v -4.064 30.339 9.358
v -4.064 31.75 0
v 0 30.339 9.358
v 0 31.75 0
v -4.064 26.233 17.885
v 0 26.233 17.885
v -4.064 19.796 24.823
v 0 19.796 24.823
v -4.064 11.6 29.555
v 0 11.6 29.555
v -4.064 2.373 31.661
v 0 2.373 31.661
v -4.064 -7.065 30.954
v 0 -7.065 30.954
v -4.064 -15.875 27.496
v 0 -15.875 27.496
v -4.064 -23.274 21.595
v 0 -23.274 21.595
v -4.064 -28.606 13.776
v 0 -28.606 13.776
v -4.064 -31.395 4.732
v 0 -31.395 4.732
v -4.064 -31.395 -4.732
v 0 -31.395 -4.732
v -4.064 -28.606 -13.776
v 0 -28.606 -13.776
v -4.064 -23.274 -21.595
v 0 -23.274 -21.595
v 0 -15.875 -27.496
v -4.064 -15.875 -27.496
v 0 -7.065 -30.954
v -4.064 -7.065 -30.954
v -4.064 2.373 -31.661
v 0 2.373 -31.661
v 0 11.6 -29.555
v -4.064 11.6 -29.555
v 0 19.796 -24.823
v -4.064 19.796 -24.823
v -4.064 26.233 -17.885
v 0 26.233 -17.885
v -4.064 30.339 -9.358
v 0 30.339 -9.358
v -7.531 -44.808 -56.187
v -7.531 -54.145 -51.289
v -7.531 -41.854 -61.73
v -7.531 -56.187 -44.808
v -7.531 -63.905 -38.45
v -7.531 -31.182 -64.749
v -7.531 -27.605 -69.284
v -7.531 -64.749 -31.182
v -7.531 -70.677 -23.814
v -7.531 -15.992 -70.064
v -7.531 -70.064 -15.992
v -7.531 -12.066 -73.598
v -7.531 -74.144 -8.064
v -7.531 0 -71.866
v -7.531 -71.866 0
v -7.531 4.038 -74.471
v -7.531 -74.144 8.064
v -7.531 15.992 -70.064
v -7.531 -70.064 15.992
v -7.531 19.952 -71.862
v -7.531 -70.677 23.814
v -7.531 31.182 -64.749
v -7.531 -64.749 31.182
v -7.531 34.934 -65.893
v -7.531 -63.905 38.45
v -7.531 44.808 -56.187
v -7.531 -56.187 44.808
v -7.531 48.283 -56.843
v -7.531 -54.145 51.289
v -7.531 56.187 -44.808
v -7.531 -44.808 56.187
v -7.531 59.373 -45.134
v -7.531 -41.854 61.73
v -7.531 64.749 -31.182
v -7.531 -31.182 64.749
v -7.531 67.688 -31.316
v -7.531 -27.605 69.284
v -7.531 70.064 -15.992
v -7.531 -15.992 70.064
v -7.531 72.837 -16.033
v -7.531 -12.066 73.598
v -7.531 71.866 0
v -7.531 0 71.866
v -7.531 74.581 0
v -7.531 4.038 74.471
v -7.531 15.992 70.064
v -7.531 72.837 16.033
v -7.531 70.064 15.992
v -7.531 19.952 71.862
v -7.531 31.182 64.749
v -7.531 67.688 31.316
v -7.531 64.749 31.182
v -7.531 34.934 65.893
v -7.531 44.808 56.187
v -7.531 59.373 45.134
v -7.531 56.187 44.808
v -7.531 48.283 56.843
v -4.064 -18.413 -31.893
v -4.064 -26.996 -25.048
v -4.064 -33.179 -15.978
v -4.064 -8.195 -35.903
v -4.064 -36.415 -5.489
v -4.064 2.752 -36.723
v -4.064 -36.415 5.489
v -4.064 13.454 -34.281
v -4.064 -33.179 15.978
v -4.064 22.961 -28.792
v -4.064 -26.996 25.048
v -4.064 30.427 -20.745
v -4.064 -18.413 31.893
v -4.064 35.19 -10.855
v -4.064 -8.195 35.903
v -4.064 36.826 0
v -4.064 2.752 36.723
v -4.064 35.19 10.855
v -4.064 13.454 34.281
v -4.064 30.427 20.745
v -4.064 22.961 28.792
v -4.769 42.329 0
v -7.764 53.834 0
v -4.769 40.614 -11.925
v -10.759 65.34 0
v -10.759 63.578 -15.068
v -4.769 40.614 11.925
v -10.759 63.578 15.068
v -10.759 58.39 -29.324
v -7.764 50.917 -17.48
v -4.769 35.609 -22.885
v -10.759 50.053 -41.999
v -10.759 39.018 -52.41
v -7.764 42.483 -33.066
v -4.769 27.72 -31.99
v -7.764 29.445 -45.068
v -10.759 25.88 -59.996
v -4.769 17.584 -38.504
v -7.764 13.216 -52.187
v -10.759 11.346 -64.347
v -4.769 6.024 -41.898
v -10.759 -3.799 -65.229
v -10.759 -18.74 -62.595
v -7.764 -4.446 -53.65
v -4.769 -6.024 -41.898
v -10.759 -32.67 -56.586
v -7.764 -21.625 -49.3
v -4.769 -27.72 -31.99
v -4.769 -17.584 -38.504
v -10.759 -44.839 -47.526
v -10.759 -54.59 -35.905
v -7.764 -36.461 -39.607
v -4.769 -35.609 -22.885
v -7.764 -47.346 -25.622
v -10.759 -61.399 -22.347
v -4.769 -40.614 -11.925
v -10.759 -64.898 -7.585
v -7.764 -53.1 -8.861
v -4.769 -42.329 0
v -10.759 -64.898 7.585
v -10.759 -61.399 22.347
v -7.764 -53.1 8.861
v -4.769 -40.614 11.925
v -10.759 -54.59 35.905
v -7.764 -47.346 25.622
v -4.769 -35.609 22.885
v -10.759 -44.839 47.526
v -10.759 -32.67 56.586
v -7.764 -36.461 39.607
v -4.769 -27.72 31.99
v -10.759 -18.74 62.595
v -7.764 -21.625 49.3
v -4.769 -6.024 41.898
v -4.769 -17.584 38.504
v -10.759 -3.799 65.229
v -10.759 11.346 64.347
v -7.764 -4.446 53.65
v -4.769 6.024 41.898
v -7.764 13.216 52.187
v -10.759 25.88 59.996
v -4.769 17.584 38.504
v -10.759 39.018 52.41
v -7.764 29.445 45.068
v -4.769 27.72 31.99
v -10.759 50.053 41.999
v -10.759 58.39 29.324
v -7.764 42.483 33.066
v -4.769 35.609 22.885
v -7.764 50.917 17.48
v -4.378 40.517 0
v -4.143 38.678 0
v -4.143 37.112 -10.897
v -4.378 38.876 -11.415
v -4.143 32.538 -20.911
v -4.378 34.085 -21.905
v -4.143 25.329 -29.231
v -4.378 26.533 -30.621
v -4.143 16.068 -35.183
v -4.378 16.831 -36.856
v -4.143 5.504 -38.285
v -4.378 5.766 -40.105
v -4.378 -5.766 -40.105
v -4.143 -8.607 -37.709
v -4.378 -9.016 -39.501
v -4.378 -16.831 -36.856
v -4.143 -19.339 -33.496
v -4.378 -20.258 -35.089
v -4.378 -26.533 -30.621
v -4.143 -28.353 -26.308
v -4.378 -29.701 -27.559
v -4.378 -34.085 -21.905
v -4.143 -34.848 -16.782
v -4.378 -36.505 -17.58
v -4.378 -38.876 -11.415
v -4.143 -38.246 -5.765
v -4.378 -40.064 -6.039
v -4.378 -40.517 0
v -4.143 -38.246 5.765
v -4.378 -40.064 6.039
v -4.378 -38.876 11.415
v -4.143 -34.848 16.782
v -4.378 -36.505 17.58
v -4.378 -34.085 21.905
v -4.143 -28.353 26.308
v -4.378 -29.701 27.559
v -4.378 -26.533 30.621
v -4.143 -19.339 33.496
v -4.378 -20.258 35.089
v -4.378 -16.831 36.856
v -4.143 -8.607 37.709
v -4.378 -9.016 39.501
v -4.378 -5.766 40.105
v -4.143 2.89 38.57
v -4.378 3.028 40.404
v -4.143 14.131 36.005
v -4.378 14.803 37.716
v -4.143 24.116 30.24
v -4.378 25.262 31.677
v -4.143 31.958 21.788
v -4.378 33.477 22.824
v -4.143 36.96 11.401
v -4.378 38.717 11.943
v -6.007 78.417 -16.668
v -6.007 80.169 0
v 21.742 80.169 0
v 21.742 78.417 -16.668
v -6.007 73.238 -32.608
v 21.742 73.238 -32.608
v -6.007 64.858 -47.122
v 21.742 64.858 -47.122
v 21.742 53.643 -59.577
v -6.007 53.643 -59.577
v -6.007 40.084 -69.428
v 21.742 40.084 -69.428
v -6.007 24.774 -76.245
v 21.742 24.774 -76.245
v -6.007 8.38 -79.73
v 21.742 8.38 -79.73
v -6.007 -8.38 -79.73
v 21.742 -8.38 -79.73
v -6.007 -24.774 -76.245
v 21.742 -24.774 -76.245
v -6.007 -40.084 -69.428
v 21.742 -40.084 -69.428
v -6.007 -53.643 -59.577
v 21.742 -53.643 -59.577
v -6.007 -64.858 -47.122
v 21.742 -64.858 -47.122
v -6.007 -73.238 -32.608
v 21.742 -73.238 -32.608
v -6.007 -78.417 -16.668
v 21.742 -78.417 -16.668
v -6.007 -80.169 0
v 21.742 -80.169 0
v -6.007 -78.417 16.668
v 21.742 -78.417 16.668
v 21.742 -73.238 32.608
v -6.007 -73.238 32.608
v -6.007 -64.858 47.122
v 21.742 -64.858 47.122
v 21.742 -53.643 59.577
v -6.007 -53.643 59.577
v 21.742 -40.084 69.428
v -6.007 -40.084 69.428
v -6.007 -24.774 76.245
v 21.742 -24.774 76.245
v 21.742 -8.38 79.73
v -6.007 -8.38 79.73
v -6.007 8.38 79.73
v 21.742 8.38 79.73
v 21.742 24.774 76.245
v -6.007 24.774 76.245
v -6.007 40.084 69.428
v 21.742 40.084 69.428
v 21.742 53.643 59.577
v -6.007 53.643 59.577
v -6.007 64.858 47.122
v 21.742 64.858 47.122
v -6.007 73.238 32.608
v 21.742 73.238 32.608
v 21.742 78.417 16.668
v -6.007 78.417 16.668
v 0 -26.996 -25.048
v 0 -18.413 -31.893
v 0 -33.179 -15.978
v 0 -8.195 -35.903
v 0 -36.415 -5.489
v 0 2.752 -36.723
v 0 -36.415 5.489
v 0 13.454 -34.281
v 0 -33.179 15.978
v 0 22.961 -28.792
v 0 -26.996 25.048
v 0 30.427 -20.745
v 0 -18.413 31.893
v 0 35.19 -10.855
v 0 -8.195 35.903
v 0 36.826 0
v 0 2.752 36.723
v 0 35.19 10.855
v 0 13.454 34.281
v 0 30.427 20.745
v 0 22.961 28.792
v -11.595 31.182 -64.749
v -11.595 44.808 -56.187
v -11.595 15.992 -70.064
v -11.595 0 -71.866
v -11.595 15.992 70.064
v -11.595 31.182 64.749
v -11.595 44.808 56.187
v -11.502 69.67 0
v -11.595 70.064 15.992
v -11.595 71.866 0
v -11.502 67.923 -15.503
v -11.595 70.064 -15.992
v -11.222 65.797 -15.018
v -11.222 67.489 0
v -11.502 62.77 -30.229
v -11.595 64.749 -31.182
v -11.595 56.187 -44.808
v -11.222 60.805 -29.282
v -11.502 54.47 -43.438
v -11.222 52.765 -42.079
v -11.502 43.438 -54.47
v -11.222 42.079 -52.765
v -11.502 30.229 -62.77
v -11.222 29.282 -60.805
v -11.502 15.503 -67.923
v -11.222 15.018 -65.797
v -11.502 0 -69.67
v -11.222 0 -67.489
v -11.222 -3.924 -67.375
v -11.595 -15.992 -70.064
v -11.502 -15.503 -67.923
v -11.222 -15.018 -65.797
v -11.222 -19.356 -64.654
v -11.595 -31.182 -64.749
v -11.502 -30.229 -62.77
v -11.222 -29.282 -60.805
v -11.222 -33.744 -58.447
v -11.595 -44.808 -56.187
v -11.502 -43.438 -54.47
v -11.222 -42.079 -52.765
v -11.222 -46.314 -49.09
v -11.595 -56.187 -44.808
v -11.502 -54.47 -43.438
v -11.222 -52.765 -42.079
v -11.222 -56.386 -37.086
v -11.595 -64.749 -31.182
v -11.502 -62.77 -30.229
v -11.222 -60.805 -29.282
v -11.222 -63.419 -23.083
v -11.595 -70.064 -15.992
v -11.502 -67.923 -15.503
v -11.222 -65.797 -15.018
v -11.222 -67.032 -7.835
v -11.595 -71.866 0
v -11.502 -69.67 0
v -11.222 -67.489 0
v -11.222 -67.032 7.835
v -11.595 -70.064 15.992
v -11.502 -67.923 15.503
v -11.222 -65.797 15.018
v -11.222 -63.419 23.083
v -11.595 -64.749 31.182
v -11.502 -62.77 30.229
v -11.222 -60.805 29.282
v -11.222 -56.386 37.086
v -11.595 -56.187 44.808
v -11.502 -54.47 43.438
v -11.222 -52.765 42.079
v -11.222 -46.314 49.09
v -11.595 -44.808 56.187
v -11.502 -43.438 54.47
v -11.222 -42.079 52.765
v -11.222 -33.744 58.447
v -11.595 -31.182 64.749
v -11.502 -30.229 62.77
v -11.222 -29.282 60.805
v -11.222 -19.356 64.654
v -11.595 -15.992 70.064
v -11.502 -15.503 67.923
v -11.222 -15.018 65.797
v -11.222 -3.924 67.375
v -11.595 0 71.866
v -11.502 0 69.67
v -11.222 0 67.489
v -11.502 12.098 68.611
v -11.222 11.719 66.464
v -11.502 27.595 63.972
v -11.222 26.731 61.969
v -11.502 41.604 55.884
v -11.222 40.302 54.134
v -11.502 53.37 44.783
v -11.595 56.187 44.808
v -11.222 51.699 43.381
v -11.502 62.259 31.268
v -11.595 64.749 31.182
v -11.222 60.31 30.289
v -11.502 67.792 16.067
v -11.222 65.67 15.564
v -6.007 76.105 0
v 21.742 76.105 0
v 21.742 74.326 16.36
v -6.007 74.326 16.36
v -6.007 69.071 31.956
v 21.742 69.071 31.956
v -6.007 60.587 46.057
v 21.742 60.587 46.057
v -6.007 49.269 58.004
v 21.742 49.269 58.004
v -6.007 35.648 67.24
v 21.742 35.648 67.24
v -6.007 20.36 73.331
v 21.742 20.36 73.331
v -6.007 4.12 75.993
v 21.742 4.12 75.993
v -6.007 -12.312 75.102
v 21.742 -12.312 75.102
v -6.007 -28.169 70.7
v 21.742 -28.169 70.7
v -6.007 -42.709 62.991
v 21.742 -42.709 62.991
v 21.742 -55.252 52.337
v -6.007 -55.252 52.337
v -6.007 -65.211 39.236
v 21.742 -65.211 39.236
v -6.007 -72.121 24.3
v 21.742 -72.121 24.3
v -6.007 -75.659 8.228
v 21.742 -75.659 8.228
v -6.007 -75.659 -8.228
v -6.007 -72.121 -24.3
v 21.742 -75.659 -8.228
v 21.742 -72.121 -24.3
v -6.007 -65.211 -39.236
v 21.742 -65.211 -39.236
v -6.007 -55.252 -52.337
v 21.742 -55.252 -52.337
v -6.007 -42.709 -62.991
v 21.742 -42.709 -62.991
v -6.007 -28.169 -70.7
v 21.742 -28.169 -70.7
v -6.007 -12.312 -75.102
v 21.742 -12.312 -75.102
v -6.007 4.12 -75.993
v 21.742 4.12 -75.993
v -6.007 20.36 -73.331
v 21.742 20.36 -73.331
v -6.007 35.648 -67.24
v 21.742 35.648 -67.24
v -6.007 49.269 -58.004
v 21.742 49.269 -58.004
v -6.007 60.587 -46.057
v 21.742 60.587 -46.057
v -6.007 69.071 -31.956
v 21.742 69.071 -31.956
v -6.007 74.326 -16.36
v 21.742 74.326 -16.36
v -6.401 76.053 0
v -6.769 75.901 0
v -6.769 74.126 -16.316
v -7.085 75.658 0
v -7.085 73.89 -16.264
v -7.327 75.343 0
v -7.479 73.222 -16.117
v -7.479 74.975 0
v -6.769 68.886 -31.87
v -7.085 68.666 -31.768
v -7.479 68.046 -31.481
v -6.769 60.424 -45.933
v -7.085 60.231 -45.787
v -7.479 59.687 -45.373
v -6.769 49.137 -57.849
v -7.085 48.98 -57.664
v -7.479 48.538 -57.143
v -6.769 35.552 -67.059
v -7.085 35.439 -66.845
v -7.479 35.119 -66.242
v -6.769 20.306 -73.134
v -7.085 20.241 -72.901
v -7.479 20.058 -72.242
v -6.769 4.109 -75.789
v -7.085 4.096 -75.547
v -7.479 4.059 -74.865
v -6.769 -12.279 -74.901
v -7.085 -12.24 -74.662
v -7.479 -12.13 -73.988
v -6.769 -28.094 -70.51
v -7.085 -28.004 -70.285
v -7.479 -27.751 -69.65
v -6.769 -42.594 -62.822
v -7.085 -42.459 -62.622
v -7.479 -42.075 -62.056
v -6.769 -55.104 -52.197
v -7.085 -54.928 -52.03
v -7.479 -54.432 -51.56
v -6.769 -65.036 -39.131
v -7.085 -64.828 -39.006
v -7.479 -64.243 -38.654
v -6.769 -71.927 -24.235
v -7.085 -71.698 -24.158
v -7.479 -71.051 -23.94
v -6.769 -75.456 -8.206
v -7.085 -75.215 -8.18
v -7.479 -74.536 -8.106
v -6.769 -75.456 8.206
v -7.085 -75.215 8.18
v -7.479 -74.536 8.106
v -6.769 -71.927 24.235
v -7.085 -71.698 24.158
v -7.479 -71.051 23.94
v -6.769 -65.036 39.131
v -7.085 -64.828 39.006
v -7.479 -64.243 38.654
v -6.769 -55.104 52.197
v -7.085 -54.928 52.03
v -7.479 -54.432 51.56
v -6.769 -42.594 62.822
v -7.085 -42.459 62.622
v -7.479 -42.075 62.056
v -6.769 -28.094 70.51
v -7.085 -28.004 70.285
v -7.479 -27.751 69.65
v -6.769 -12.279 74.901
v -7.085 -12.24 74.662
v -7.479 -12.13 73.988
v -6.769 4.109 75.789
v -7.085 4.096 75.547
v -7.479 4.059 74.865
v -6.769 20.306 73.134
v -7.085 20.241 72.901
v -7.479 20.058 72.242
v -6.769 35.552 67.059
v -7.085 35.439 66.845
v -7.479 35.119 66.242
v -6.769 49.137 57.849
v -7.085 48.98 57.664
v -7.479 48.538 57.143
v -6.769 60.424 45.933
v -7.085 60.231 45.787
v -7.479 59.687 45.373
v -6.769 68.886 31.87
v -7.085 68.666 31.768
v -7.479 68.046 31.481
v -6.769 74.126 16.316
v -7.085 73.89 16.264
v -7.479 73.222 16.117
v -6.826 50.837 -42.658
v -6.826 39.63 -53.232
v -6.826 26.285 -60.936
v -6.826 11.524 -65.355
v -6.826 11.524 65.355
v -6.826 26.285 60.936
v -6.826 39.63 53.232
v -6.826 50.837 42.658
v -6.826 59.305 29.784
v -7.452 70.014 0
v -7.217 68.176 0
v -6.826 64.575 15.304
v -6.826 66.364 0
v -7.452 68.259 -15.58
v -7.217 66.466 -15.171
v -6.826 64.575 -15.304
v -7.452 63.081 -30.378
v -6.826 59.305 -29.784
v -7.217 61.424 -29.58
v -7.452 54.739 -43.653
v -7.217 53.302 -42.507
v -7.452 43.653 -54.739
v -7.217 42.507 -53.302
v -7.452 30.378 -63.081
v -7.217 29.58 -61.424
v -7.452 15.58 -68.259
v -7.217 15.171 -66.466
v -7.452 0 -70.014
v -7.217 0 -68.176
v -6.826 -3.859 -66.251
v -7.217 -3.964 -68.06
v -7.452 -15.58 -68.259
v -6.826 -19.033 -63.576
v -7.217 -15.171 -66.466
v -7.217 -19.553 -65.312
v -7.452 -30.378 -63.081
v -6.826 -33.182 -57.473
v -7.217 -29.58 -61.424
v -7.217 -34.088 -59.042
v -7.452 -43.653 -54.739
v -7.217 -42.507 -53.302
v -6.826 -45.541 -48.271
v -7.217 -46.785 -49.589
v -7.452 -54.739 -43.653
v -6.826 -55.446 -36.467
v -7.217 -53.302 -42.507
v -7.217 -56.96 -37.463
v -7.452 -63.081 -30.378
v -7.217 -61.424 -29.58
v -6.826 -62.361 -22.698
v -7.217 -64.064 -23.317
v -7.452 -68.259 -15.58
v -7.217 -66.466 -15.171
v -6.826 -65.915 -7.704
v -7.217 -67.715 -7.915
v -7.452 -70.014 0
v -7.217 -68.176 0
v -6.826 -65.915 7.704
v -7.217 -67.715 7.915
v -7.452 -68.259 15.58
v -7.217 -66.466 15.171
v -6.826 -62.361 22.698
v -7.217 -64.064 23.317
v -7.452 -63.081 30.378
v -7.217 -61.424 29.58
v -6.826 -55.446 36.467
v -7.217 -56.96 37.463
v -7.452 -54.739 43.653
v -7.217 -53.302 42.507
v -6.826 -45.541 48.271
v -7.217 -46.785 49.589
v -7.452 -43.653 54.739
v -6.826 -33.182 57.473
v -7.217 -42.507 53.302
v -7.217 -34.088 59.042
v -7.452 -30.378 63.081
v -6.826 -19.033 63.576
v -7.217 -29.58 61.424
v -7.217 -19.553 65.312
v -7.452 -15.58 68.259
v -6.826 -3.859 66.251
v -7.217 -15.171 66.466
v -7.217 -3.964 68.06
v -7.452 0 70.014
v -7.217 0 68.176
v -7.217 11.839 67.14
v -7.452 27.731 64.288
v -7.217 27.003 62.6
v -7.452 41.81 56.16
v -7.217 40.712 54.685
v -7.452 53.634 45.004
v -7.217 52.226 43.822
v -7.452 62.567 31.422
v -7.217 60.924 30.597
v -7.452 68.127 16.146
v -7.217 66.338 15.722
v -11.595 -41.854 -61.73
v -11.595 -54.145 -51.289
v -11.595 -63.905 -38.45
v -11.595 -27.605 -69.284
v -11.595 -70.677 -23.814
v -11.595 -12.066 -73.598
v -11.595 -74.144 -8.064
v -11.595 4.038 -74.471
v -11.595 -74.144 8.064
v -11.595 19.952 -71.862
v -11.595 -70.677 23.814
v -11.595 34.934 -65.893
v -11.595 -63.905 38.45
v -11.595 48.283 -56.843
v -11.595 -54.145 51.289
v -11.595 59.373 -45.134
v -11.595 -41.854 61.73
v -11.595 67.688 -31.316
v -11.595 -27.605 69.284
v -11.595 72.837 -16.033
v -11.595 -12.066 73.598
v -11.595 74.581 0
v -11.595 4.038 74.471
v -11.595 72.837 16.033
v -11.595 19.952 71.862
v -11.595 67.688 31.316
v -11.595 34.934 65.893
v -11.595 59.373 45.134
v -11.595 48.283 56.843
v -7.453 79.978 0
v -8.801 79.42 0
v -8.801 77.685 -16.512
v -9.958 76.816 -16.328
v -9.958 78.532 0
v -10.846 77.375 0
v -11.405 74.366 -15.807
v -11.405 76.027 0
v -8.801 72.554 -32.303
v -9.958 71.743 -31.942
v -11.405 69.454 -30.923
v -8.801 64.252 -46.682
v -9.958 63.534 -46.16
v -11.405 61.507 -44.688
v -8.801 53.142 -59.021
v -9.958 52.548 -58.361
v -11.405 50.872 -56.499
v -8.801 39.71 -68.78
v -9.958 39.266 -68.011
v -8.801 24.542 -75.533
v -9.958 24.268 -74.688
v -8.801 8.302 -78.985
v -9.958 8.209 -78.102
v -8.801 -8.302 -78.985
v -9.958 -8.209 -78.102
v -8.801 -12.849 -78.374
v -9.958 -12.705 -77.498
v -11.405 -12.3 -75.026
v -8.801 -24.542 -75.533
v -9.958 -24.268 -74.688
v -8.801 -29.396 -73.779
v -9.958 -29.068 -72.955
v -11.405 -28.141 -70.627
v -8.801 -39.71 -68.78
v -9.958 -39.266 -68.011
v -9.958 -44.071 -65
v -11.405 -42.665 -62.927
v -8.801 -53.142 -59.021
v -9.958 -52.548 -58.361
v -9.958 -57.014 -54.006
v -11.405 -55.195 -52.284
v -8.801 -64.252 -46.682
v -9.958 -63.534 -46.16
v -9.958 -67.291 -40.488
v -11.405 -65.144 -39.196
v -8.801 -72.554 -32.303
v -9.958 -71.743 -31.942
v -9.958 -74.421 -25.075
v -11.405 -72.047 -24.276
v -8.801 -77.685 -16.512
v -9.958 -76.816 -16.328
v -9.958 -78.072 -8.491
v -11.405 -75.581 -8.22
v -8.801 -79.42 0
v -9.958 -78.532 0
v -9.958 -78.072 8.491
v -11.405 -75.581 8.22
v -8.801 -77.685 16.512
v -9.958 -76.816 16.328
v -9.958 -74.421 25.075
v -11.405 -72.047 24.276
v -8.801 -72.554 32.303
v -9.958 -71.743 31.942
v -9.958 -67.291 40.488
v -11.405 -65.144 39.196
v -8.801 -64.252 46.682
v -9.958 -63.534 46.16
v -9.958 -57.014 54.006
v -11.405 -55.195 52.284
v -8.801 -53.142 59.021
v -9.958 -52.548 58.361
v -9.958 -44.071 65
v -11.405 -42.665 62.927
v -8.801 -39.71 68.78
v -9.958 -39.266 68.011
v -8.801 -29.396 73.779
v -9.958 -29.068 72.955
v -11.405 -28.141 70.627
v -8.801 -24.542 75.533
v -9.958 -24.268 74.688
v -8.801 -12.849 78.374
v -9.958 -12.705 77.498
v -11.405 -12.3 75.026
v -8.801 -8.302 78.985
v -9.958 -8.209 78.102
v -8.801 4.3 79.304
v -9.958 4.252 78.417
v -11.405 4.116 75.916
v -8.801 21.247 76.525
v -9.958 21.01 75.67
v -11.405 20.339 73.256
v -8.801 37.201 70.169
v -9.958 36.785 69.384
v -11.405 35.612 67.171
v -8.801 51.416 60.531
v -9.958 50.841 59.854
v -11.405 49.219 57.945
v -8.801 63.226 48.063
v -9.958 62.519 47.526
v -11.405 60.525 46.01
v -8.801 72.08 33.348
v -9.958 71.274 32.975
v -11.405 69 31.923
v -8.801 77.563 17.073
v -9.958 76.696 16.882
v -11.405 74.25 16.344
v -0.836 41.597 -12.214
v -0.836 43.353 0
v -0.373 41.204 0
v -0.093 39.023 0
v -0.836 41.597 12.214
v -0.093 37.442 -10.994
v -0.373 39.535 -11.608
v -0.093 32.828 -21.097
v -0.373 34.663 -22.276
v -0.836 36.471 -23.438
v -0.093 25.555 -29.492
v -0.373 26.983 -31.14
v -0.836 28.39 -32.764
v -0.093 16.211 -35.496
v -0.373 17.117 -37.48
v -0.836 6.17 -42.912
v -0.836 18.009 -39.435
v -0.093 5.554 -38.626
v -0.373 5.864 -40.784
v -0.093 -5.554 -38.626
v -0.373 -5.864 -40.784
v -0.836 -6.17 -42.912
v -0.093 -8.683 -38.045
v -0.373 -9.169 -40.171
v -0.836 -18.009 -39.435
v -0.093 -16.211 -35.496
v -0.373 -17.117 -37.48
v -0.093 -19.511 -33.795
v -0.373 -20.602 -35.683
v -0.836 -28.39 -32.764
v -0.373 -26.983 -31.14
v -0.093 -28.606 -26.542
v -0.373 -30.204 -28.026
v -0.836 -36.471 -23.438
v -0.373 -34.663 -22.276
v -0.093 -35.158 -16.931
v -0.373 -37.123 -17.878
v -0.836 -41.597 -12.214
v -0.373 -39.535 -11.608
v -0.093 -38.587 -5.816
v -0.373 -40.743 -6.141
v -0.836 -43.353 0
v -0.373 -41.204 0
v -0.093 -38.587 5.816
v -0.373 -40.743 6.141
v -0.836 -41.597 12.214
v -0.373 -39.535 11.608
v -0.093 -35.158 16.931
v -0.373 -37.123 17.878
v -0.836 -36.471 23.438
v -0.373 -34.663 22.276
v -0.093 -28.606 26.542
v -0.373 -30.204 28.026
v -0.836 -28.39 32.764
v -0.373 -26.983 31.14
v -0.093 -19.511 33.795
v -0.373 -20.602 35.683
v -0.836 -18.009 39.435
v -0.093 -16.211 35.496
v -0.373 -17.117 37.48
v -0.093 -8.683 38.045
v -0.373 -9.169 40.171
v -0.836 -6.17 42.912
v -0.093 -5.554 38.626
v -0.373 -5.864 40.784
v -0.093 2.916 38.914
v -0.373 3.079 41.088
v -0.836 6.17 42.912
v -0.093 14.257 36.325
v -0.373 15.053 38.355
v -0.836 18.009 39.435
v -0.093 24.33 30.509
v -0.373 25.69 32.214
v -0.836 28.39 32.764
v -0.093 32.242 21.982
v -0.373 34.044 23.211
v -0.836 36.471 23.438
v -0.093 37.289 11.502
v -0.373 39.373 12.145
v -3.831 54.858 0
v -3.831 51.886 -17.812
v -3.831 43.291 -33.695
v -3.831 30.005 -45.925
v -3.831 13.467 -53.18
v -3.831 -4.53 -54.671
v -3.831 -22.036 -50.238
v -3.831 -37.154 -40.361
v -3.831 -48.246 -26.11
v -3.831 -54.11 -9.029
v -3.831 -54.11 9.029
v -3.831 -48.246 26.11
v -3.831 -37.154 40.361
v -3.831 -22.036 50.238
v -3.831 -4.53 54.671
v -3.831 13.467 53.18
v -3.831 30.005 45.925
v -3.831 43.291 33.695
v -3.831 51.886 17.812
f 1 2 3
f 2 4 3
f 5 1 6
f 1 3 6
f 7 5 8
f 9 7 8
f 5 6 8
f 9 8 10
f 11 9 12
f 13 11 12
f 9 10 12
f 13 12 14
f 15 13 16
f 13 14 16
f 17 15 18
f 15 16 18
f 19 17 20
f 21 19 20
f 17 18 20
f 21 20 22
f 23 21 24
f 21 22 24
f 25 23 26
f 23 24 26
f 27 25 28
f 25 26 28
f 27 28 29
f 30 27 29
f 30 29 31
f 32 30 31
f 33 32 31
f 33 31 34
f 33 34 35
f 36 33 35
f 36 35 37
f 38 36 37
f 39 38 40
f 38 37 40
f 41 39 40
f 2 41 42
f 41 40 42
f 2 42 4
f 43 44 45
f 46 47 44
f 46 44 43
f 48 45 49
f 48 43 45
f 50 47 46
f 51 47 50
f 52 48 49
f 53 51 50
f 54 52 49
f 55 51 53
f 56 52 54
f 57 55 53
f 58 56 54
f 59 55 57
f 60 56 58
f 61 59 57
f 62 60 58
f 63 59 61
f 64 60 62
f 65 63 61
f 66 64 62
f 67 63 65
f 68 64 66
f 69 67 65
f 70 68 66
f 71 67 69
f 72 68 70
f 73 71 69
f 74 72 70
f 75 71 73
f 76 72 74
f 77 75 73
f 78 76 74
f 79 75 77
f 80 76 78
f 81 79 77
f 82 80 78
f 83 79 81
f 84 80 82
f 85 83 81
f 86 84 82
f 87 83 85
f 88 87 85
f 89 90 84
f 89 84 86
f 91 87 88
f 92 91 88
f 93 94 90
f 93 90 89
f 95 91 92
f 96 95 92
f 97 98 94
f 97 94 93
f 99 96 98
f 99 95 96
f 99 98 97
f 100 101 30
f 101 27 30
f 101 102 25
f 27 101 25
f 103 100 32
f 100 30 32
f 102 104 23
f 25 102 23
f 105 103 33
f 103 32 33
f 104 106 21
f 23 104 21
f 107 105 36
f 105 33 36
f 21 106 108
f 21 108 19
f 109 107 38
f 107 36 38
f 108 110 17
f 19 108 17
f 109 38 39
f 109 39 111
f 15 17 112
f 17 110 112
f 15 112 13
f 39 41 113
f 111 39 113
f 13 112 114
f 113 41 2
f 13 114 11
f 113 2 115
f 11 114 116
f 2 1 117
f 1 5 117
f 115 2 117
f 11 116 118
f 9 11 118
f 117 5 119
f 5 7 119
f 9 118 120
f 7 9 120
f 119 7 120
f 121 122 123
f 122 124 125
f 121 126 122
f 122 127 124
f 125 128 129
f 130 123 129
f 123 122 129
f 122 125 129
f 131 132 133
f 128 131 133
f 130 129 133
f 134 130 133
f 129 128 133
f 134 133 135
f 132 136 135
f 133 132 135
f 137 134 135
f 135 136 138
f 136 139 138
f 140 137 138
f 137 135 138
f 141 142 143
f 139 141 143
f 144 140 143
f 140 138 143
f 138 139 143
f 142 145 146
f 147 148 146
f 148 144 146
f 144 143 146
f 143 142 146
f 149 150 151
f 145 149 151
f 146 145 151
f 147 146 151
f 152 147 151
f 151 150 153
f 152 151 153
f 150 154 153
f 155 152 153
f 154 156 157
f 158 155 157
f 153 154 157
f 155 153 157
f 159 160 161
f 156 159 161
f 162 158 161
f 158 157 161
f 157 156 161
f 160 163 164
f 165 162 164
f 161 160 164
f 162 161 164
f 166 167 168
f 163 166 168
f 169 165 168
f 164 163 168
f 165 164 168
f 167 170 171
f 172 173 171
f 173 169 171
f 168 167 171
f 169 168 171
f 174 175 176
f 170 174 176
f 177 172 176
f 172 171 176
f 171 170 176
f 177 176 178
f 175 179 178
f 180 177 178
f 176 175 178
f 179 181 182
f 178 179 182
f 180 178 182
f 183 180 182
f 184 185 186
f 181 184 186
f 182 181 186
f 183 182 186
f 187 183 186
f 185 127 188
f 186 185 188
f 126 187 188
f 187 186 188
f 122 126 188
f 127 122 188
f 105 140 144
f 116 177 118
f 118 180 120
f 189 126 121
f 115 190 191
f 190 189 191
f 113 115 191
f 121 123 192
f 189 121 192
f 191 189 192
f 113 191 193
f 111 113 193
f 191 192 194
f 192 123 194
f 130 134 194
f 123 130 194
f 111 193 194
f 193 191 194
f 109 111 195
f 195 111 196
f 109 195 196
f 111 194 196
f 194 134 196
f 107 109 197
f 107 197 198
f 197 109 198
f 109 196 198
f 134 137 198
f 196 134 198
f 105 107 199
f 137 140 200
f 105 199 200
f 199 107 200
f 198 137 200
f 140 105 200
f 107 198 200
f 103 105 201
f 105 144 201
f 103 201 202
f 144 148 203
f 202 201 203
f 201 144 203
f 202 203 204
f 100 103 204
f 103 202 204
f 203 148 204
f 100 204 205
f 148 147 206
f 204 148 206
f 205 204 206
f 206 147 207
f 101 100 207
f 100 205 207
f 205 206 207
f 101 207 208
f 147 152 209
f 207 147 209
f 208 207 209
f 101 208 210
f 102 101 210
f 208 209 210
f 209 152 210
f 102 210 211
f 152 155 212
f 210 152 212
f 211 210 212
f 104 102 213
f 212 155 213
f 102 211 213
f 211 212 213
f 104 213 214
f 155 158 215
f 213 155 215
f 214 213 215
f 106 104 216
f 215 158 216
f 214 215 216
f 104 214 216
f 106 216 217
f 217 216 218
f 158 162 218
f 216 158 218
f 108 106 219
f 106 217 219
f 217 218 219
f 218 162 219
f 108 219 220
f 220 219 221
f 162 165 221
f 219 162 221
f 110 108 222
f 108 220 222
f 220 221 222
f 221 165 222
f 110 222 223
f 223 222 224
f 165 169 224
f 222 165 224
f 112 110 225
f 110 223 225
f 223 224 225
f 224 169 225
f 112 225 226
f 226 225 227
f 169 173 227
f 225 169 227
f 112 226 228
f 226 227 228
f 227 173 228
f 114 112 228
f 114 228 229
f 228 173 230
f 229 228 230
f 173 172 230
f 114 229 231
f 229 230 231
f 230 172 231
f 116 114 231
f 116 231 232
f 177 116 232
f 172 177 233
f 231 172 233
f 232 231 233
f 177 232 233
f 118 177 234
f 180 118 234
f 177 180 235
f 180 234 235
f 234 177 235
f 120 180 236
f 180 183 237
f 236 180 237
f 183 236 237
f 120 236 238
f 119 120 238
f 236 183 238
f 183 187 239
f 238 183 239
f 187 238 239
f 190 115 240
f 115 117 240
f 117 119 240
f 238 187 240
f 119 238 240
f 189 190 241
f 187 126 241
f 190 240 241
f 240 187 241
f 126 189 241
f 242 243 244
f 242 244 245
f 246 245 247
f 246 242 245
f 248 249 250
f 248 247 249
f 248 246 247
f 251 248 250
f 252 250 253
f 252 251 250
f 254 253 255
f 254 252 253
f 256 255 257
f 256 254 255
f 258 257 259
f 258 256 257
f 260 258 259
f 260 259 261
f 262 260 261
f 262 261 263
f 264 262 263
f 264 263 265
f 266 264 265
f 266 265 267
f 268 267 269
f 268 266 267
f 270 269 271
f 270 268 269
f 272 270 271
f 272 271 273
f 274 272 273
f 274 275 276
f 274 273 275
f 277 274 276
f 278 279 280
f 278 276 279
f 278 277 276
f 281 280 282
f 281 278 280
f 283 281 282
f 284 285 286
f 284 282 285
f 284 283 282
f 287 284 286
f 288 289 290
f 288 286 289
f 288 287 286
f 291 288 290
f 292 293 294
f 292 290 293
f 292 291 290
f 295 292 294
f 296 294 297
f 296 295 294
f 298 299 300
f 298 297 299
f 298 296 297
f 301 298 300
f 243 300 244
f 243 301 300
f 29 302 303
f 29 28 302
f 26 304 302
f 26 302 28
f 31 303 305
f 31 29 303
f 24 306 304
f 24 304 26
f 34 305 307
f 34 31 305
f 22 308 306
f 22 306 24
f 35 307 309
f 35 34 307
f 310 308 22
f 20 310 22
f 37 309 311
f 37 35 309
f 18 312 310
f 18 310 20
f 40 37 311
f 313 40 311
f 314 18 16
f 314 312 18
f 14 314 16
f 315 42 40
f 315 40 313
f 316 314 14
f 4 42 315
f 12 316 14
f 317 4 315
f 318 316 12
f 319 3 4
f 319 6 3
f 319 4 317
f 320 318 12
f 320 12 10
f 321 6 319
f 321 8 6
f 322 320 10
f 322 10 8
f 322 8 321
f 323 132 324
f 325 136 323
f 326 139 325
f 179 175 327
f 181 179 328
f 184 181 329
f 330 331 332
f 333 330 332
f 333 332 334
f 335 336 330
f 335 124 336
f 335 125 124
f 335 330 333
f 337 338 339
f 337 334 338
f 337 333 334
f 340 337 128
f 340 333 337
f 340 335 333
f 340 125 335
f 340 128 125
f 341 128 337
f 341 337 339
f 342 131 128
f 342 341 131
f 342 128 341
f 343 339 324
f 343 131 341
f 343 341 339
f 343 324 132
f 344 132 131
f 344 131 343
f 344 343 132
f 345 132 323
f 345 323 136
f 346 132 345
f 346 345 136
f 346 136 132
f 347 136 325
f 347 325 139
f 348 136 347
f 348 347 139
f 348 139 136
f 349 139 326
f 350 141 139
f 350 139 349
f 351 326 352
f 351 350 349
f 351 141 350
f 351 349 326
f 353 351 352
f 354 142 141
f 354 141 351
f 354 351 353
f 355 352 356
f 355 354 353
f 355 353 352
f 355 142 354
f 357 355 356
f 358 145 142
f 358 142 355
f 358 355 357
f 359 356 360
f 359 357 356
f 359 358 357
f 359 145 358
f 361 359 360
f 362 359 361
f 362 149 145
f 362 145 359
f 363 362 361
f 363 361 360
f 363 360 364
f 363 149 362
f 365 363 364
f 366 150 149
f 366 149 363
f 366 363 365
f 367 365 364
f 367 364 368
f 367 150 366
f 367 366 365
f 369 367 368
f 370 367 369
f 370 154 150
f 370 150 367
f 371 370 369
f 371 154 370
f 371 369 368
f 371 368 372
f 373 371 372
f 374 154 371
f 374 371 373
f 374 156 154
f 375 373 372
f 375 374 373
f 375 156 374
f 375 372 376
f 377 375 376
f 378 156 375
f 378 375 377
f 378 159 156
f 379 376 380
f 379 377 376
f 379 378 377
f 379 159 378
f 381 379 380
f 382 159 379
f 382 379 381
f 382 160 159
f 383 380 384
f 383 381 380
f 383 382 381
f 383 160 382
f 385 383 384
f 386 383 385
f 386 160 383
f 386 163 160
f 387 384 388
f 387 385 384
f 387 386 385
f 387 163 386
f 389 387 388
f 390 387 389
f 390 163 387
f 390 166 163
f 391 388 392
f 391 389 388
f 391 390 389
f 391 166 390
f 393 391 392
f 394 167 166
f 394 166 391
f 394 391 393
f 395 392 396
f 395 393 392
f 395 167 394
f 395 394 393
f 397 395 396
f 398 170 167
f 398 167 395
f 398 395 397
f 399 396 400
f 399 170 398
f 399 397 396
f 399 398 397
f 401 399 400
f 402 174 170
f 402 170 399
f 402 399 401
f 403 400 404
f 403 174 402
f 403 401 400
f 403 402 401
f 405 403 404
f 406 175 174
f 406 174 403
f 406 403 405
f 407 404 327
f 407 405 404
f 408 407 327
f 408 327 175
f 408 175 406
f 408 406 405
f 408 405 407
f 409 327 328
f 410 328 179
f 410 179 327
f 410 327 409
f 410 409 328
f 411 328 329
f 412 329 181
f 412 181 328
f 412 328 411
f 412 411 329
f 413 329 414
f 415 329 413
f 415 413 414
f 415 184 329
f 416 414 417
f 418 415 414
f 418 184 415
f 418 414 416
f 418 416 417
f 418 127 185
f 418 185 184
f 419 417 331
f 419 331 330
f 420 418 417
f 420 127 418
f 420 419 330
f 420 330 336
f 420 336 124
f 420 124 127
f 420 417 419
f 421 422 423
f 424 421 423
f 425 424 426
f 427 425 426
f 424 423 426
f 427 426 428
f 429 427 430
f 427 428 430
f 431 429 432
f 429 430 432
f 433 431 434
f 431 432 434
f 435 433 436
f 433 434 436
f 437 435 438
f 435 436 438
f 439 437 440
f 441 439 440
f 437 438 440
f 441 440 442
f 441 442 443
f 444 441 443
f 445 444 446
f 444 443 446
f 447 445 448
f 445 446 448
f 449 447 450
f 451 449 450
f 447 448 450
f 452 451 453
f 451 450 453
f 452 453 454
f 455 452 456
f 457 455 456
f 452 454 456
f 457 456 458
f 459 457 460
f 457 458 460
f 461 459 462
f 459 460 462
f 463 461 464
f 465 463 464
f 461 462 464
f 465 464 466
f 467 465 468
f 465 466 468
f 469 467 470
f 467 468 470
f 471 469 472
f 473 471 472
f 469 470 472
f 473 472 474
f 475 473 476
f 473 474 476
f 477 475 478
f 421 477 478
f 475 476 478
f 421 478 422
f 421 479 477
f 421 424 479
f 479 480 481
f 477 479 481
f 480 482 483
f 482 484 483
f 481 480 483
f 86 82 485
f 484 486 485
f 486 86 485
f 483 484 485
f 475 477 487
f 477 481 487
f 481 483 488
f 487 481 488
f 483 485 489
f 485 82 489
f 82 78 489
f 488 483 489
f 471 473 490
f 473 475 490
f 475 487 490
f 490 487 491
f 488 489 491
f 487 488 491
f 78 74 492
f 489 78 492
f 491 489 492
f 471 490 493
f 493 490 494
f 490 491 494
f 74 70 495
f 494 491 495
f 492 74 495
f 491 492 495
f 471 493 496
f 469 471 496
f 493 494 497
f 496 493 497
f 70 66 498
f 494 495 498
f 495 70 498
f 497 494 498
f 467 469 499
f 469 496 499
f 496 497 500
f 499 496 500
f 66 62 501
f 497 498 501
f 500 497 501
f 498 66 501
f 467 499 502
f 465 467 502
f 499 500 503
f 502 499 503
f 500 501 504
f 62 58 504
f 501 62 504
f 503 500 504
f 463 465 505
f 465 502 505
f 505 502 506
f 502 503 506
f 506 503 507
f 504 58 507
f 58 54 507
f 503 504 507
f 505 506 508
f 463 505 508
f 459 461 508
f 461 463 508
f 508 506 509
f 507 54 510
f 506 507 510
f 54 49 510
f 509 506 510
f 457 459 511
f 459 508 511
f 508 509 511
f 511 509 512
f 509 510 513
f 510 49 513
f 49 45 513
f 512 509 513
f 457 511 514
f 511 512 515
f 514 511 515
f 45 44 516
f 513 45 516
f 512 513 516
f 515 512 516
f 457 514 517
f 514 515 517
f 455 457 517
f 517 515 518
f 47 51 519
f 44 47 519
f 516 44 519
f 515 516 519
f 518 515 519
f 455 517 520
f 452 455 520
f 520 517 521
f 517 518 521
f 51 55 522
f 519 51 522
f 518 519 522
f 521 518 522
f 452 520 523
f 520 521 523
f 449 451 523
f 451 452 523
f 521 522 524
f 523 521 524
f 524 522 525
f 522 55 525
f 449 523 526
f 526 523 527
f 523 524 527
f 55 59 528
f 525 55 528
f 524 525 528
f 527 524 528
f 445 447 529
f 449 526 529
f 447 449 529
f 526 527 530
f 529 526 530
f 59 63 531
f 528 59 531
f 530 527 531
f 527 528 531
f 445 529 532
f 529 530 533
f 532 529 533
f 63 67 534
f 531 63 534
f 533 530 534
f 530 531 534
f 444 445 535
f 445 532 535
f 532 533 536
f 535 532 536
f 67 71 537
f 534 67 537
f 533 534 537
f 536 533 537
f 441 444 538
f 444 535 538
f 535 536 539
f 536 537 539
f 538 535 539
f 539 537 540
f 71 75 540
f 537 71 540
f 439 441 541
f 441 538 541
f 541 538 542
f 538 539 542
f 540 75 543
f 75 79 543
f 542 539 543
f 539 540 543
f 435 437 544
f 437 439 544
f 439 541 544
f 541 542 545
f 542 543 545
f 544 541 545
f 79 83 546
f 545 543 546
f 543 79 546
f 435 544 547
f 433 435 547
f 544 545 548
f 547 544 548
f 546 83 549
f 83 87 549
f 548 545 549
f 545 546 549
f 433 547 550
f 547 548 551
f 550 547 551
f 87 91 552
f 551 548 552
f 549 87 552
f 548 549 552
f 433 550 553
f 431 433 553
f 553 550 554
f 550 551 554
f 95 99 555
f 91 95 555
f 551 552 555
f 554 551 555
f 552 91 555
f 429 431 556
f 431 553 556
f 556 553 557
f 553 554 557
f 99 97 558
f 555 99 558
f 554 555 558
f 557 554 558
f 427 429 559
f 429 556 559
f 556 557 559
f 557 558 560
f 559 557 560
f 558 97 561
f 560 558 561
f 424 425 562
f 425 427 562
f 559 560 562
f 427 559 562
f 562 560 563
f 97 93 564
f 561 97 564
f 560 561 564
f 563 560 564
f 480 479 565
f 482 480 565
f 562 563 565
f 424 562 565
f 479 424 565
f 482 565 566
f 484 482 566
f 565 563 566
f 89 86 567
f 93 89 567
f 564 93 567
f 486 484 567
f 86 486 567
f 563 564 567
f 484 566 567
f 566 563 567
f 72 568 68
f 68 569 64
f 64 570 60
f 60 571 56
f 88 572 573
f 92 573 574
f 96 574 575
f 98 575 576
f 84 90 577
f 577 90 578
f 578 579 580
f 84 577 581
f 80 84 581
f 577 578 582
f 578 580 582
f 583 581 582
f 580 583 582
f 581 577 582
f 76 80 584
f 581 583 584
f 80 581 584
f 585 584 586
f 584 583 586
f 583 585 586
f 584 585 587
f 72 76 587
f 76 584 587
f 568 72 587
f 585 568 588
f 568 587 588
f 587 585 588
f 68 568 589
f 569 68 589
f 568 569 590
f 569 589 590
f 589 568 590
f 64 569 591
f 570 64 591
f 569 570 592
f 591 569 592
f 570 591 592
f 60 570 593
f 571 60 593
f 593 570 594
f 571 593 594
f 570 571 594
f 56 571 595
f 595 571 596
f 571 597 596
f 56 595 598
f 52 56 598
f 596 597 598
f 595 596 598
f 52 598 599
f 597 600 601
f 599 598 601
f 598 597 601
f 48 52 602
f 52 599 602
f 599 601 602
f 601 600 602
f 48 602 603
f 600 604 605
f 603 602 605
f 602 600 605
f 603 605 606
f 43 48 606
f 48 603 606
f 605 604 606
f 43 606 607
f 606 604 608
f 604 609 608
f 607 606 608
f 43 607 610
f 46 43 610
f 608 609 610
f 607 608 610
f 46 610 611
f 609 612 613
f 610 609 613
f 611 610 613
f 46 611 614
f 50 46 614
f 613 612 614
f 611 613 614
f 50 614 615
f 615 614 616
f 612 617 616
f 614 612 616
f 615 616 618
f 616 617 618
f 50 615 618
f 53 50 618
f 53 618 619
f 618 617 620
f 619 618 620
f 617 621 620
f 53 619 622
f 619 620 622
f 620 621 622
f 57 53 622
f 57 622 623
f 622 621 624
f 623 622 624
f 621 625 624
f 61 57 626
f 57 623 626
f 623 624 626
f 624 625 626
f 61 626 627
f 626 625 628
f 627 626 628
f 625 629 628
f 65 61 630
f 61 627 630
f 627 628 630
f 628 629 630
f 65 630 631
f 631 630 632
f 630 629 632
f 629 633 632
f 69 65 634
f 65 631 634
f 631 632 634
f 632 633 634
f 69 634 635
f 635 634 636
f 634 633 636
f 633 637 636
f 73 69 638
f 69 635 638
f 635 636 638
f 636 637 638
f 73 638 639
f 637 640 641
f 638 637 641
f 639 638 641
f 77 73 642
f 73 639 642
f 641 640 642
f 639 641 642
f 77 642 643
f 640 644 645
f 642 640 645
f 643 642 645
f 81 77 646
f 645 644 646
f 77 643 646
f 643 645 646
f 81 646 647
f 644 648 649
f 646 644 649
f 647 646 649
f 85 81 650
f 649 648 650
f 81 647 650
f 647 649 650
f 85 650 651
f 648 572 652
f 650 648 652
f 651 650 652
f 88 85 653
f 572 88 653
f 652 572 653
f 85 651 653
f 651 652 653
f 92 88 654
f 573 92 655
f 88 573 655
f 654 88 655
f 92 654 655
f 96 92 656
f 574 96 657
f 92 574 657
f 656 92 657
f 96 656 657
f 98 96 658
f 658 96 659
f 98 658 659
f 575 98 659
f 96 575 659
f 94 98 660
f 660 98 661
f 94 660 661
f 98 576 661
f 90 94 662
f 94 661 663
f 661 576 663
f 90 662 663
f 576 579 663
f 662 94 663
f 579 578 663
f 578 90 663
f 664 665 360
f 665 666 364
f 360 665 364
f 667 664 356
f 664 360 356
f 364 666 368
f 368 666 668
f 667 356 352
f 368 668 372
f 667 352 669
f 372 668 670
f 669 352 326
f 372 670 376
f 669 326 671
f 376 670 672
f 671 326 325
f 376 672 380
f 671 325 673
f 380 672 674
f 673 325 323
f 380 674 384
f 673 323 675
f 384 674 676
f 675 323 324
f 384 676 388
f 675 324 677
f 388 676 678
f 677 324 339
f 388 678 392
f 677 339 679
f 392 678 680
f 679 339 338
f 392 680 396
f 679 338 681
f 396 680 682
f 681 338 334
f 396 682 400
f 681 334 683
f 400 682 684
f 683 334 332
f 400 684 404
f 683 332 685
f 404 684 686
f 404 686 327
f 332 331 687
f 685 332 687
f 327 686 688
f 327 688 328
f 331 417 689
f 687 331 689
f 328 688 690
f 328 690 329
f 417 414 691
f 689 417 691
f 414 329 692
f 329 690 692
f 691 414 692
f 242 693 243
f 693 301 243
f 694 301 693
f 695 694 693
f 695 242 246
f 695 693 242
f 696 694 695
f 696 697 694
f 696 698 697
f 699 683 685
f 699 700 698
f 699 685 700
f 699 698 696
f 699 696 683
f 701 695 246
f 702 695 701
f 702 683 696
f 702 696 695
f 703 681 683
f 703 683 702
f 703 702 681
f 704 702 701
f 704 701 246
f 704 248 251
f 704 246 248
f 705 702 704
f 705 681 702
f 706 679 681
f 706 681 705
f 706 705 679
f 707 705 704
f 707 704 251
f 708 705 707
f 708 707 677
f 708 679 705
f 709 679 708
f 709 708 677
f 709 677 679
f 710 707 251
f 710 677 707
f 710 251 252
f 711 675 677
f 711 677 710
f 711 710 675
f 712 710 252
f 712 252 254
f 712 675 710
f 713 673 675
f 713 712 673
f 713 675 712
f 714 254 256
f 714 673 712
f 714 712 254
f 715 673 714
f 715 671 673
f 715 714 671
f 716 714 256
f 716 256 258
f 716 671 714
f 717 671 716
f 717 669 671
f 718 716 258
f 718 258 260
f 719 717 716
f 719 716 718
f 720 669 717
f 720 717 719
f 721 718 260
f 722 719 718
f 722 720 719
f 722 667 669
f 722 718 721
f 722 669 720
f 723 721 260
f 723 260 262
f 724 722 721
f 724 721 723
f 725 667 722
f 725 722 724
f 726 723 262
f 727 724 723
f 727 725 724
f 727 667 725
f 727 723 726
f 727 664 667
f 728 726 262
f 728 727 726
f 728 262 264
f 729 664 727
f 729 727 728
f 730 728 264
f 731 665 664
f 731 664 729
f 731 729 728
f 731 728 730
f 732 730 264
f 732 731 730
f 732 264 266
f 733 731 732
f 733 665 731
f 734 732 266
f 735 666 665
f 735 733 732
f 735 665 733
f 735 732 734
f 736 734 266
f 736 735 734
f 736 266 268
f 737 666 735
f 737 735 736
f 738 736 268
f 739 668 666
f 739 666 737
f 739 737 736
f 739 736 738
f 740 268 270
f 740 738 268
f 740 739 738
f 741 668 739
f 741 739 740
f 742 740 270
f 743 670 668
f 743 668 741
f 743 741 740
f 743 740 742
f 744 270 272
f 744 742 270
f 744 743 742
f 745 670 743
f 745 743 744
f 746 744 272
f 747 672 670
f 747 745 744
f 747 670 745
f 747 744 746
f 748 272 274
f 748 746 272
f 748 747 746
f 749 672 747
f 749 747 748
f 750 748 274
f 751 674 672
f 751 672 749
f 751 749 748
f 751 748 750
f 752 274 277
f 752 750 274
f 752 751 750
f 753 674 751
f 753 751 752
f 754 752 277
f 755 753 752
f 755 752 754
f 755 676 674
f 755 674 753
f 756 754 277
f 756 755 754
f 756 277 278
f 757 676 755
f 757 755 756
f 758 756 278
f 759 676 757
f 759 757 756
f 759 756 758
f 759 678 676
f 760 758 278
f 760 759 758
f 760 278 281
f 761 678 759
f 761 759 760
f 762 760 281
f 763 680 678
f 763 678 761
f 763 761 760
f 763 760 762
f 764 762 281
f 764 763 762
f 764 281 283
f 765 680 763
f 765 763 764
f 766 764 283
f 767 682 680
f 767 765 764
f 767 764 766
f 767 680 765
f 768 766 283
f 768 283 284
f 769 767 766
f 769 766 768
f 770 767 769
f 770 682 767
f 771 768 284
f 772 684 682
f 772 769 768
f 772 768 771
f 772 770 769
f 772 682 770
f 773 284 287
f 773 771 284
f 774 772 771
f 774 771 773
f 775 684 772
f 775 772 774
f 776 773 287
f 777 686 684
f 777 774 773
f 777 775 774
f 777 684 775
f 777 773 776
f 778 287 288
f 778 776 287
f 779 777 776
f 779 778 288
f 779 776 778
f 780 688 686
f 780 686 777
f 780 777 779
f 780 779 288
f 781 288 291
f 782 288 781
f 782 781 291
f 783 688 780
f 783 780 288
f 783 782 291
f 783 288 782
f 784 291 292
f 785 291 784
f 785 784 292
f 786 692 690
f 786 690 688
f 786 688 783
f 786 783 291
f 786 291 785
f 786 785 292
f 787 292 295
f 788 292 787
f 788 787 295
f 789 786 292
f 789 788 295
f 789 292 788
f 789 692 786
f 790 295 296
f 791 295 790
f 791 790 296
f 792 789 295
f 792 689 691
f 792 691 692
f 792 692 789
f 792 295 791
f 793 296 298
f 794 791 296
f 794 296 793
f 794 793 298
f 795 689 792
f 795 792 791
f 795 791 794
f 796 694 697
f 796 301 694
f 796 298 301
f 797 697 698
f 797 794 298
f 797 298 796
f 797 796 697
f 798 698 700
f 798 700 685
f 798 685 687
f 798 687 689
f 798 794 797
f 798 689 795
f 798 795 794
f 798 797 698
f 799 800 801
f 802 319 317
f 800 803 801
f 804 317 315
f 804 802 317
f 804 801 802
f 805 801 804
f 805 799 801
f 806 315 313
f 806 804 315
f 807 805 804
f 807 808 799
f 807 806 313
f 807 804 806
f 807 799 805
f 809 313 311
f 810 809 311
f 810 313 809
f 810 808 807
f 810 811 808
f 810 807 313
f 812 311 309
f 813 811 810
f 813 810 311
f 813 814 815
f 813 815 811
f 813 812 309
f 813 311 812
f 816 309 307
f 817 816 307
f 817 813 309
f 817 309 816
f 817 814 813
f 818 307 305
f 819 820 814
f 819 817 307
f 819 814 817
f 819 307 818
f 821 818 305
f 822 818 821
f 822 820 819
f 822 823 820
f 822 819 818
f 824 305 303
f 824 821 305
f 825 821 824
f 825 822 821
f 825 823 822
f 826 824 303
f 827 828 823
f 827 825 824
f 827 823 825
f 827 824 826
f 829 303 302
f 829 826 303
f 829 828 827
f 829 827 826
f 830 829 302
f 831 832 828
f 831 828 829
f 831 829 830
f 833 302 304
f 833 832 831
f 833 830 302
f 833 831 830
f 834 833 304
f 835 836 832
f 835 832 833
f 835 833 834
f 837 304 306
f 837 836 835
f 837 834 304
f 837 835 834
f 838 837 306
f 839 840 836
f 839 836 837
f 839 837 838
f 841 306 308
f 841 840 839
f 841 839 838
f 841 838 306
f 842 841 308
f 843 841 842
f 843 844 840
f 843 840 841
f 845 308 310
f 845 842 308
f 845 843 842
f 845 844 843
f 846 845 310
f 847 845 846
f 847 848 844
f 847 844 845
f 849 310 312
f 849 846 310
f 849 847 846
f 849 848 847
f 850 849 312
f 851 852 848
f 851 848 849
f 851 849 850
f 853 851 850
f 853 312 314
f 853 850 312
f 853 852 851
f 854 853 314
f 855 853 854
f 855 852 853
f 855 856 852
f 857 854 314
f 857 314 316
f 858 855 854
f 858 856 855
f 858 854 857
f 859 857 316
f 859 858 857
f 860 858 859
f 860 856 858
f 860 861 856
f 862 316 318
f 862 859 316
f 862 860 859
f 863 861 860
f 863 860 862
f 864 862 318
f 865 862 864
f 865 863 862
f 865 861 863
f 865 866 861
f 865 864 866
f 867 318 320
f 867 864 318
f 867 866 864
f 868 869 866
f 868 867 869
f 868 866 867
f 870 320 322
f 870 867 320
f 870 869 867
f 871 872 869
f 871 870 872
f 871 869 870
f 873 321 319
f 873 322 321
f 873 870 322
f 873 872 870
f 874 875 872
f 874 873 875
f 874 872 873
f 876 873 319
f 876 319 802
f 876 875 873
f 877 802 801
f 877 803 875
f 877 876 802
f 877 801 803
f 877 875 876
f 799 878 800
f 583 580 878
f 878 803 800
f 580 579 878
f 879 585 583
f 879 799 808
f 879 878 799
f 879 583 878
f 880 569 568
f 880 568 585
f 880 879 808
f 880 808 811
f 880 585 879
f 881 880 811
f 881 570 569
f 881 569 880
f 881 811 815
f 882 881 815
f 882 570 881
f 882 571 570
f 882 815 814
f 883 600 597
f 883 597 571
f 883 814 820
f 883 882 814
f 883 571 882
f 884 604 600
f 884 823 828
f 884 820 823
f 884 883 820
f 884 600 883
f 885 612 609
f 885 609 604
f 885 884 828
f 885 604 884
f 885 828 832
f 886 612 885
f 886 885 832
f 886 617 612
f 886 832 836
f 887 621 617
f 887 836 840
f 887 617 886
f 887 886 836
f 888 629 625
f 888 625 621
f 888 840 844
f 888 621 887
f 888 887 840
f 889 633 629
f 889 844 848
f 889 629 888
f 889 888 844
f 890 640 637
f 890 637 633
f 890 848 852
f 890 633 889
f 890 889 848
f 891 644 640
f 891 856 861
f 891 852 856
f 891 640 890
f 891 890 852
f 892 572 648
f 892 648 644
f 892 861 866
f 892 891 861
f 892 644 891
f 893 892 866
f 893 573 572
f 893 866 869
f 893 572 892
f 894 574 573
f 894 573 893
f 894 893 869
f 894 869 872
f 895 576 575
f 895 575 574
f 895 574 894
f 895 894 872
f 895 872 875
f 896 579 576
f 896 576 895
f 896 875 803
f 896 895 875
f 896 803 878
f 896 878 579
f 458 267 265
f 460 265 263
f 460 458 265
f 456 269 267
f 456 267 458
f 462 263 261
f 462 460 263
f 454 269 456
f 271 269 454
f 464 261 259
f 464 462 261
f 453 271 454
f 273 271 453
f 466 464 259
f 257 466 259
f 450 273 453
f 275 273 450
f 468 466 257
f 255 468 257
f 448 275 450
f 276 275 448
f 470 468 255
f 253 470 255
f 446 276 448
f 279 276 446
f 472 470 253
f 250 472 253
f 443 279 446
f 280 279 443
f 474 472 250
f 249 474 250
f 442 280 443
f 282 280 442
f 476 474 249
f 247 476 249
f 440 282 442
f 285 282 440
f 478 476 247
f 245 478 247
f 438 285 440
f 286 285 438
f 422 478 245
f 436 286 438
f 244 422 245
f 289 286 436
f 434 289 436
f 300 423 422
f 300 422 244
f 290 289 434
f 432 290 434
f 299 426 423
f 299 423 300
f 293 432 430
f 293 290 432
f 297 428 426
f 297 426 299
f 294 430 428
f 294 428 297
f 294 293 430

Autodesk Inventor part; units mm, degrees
ref_plane "YZ Plane" through (0, 0, 0) normal (1, 0, 0) x (0, 1, 0)
ref_plane "XZ Plane" through (0, 0, 0) normal (0, 1, 0) x (-1, 0, 0)
ref_plane "XY Plane" through (0, 0, 0) normal (0, 0, 1) x (1, 0, 0)
sketch "Sketch1" plane through (0, 0, 0) normal (0, 0, 1) x (1, 0, 0)
  line L0 (0, -8.1326) -> (0, 105.7239) projected
  line L1 (-30.6691, 0) -> (36.0366, 0) projected
  line L2 (0, 31.75) -> (0, 36.8263)
  arc A0 (0, 36.8263) -> (-0.8357, 43.3529) centre (-25.9044, 36.8263) ccw
  line L3 (-0.8357, 43.3529) -> (-6.8264, 66.3636)
  arc A1 (-7.531, 71.8662) -> (-6.8264, 66.3636) centre (14.3094, 71.8662) ccw
  line L4 (-7.531, 71.8662) -> (-7.531, 74.5808)
  arc A2 (-6.007, 76.1048) -> (-7.531, 74.5808) centre (-6.007, 74.5808) ccw
  line L5 (-6.007, 76.1048) -> (21.7425, 76.1048)
  line L6 (21.7425, 80.1688) -> (-6.007, 80.1688)
  arc A3 (-6.007, 80.1688) -> (-11.595, 74.5808) centre (-6.007, 74.5808) ccw
  line L7 (-11.595, 74.5808) -> (-11.595, 71.8662)
  arc A4 (-11.595, 71.8662) -> (-10.7593, 65.3396) centre (14.3094, 71.8662) ccw
  line L8 (-10.7593, 65.3396) -> (-4.7686, 42.329)
  arc A5 (-4.064, 36.8263) -> (-4.7686, 42.329) centre (-25.9044, 36.8263) ccw
  line L9 (-4.064, 36.8263) -> (-4.064, 31.75)
  line L10 (-4.064, 31.75) -> (0, 31.75)
  line L11 (21.7425, 80.1688) -> (21.7425, 76.1048)
  point P0 (0, 0)
  dimension "d0" = 33.3375
  dimension "d1" = 4.064
  dimension "d2" = 1.524
  dimension "d3" = 63.5
  dimension "d4" = 160.3375
revolve "Revolution1" add sketch "Sketch1" angle 360 about axis through (-10, 0, 0) along (1, 0, 0) contours L10 L9 A5 L8 A4 L7 A3 L6 L0 L5 A2 L4 A1 L3 A0 | L0 L6 L11 L5
properties part number "BrakeDrum"
